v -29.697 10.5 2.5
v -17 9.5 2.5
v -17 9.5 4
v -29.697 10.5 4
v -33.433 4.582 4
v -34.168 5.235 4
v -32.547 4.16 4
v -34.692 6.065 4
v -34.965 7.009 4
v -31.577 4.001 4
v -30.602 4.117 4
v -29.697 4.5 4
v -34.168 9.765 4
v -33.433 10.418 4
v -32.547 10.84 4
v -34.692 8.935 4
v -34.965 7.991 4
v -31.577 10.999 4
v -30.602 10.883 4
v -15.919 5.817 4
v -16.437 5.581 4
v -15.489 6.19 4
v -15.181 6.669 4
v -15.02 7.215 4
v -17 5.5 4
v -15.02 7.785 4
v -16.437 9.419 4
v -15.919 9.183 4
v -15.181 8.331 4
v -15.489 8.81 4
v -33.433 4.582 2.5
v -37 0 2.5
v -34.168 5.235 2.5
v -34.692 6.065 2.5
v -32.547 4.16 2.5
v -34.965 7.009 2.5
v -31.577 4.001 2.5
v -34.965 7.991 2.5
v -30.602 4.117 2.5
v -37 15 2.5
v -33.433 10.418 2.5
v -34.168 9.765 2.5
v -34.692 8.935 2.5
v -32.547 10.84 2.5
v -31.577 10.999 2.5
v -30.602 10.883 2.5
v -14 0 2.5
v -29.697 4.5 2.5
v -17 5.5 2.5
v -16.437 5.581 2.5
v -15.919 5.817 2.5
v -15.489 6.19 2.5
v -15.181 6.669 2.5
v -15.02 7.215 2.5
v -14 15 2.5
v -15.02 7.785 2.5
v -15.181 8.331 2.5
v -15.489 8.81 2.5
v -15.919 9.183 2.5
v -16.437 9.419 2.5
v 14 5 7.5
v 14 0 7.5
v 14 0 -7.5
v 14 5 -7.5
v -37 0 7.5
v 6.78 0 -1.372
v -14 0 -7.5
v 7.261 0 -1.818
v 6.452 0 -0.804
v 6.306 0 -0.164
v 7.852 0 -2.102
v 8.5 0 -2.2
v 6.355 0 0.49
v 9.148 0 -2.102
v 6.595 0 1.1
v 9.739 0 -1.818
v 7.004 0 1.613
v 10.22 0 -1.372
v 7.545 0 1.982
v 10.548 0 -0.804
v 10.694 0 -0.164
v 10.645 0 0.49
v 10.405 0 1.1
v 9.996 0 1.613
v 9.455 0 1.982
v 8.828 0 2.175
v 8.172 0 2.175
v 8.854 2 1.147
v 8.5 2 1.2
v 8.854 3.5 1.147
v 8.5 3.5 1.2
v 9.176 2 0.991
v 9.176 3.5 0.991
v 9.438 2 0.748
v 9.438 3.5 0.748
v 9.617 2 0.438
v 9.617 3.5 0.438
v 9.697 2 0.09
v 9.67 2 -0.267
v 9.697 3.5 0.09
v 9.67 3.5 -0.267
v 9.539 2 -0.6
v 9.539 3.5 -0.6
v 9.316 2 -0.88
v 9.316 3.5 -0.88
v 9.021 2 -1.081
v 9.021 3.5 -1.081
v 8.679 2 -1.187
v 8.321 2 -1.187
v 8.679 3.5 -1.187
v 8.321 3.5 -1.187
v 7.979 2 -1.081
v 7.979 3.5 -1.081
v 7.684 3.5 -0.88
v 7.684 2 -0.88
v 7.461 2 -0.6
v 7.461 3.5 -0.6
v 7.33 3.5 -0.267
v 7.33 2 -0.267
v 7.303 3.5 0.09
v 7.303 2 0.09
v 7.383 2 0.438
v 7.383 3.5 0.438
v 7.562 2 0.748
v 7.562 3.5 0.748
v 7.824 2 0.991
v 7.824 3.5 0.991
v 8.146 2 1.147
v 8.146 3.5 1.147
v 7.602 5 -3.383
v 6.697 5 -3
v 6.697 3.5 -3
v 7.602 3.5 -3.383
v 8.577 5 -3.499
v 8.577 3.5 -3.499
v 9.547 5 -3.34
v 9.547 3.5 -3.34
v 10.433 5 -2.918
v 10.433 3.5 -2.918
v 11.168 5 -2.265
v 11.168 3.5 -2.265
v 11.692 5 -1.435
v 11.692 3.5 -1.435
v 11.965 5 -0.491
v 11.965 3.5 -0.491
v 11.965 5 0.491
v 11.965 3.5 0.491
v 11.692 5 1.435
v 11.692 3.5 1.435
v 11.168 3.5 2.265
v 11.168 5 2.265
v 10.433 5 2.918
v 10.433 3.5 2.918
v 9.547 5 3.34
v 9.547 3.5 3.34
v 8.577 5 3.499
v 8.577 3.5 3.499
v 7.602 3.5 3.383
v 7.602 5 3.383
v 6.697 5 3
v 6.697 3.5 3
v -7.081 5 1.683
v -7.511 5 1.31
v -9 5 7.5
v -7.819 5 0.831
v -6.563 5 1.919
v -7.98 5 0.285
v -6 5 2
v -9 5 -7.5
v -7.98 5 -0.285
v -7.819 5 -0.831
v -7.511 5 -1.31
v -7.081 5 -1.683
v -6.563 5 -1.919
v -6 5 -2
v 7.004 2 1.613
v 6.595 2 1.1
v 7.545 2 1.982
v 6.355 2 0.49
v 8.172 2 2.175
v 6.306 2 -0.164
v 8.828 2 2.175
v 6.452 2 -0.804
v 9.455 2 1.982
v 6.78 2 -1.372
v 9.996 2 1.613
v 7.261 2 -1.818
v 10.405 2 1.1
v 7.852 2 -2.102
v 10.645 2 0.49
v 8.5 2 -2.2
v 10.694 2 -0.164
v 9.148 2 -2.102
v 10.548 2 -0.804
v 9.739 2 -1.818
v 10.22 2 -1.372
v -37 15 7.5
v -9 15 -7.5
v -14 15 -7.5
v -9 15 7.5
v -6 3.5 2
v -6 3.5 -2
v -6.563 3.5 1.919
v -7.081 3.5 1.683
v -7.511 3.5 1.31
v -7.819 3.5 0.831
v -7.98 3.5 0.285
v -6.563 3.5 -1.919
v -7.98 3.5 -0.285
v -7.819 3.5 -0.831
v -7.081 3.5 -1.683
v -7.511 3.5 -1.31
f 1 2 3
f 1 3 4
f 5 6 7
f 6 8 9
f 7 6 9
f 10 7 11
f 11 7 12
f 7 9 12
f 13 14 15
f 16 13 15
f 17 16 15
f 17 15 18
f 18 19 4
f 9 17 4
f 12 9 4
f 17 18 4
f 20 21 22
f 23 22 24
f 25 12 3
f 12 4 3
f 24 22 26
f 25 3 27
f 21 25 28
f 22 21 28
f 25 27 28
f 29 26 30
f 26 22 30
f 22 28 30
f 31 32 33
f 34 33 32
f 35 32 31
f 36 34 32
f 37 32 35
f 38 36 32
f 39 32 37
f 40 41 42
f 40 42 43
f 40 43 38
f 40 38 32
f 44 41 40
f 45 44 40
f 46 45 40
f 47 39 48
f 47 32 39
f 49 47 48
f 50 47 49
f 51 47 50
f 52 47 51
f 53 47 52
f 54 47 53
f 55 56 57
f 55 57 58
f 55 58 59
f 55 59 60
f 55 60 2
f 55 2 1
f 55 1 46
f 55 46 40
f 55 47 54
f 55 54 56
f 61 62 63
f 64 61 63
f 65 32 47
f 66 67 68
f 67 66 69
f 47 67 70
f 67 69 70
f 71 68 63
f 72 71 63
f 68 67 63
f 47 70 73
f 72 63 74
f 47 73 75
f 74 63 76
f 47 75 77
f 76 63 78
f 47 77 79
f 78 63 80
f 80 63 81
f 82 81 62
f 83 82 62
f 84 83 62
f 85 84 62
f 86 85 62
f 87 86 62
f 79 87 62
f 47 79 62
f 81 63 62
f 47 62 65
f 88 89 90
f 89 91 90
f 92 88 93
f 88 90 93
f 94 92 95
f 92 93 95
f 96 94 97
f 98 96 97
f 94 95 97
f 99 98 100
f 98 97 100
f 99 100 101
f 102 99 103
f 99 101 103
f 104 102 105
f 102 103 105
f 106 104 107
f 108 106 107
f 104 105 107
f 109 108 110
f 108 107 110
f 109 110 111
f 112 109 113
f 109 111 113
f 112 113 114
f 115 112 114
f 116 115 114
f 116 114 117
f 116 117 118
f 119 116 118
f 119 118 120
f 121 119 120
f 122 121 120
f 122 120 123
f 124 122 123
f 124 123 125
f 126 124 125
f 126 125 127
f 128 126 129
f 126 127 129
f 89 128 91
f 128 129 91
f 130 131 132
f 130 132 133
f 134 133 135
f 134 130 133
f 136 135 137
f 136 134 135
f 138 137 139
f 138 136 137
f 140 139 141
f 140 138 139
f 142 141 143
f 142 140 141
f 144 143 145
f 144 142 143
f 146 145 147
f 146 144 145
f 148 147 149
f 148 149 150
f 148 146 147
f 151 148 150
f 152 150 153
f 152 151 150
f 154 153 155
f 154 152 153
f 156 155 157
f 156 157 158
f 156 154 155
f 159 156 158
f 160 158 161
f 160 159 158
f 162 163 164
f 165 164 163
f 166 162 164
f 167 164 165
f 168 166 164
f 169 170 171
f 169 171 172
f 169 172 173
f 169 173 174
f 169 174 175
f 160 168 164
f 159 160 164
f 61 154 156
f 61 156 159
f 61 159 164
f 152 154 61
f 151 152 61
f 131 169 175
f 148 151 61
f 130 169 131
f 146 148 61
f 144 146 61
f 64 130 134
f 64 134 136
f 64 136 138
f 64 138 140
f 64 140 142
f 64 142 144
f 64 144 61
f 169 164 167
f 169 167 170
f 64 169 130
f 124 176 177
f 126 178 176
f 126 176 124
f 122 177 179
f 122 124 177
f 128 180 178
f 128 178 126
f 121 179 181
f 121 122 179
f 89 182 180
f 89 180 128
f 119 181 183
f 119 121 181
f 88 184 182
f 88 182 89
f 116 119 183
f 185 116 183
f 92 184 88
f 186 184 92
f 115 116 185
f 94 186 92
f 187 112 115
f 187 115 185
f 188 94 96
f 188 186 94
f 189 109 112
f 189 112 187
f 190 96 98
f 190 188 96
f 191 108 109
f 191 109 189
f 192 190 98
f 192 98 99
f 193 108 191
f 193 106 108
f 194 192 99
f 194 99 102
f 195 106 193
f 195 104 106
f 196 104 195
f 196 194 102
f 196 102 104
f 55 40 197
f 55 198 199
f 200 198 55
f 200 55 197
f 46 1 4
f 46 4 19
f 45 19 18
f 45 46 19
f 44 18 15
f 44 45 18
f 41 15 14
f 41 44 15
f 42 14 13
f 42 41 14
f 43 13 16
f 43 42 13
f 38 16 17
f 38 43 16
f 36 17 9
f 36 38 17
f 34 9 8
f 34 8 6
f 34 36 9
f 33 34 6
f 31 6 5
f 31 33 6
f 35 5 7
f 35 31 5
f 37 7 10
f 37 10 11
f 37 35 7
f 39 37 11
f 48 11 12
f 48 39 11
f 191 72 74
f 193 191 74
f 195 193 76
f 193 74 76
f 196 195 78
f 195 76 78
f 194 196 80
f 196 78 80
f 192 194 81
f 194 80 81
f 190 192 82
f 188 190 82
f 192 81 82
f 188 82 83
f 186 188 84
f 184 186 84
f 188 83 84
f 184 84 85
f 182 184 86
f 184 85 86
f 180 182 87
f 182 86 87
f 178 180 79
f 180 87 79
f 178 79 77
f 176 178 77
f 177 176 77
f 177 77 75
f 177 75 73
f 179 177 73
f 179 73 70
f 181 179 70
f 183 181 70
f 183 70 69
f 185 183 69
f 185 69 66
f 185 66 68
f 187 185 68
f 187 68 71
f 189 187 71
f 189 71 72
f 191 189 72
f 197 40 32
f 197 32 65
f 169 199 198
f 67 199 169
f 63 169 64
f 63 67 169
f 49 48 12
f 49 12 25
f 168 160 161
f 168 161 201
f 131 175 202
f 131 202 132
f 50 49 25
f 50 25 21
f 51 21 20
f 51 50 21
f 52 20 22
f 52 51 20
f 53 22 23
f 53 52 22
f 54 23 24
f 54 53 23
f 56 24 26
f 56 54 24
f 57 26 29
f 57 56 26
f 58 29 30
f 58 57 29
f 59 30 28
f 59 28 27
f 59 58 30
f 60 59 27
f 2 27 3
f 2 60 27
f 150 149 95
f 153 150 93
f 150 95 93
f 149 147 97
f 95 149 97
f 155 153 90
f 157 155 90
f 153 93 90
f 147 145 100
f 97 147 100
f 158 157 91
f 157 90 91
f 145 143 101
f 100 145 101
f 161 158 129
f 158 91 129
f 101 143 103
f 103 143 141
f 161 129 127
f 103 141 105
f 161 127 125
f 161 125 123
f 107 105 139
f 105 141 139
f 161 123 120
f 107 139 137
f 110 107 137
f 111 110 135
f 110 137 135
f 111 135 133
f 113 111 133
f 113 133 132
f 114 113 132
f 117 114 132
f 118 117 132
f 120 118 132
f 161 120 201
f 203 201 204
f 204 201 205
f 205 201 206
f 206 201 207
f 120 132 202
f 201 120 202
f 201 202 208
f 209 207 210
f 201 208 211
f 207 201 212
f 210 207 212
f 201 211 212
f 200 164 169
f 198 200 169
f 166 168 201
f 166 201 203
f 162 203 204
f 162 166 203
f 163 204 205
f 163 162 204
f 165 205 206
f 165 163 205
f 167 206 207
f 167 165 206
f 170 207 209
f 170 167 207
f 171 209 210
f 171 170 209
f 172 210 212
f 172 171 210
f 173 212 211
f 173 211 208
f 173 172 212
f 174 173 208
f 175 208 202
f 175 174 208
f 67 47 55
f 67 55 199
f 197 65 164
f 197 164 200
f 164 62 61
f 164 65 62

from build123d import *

# Parameters (mm, degrees)
SKETCH_1_W                   = 28
SKETCH_1_H                   = 15
EXTRUDE_1_DEPTH              = 5
SKETCH_2_W                   = 5
SKETCH_2_H                   = 15
EXTRUDE_2_DEPTH              = 10
SKETCH_3_W                   = 5
SKETCH_3_H                   = 15
EXTRUDE_3_DEPTH              = 23
CUT_EXTRUDE_1_DEPTH          = 1.5
HOLE_WIZARD_M2_1_D           = 2.4
HOLE_WIZARD_M2_1_CBORE_D     = 4.4
HOLE_WIZARD_M2_1_CBORE_DEPTH = 2
CUT_EXTRUDE_2_DEPTH          = 1.5


with BuildPart() as part:
    # 草图1 → 凸台-拉伸1 (new body)
    with BuildSketch(Plane(origin=(0, 0, 0), x_dir=(1, 0, 0), z_dir=(0, 1, 0))):
        Rectangle(SKETCH_1_W, SKETCH_1_H)
    extrude(amount=EXTRUDE_1_DEPTH)

    # 草图2 → 凸台-拉伸2 (add)
    with BuildSketch(Plane(origin=(0, 5, 0), x_dir=(1, 0, 0), z_dir=(0, 1, 0))):
        with Locations((-11.5, 0)):
            Rectangle(SKETCH_2_W, SKETCH_2_H)
    extrude(amount=EXTRUDE_2_DEPTH)

    # 草图3 → 凸台-拉伸3 (add)
    with BuildSketch(Plane.ZY.offset(14)):
        with Locations((5, 7.5)):
            Rectangle(SKETCH_3_W, SKETCH_3_H)
    extrude(amount=EXTRUDE_3_DEPTH)

    # 草图4 → 切除-拉伸1 (cut)
    with BuildSketch(Plane(origin=(0, 5, 0), x_dir=(1, 0, 0), z_dir=(0, 1, 0))):
        with BuildLine():
            Line((-6, 2), (6.697224362, 3))
            ThreePointArc((6.697224362, 3), (12, 0), (6.697224362, -3))
            Line((6.697224362, -3), (-6, -2))
            ThreePointArc((-6, -2), (-8, 0), (-6, 2))
        make_face()
    extrude(amount=-CUT_EXTRUDE_1_DEPTH, mode=Mode.SUBTRACT)

    # M2 凹头盖螺钉的柱形沉头孔1 (through all)
    with Locations(Plane(origin=(8.5, 0, 0), x_dir=(0, 0, -1), z_dir=(0, -1, 0))):
        with Locations((0, 0)):
            CounterBoreHole(HOLE_WIZARD_M2_1_D / 2, HOLE_WIZARD_M2_1_CBORE_D / 2, HOLE_WIZARD_M2_1_CBORE_DEPTH)

    # 草图7 → 切除-拉伸2 (cut)
    with BuildSketch(Plane(origin=(0, 0, 2.5), x_dir=(-1, 0, 0), z_dir=(0, 0, -1))):
        with BuildLine():
            Line((17, 9.5), (29.697224362, 10.5))
            ThreePointArc((29.697224362, 10.5), (35, 7.5), (29.697224362, 4.5))
            Line((29.697224362, 4.5), (17, 5.5))
            ThreePointArc((17, 5.5), (15, 7.5), (17, 9.5))
        make_face()
    extrude(amount=-CUT_EXTRUDE_2_DEPTH, mode=Mode.SUBTRACT)


solid = part.part
